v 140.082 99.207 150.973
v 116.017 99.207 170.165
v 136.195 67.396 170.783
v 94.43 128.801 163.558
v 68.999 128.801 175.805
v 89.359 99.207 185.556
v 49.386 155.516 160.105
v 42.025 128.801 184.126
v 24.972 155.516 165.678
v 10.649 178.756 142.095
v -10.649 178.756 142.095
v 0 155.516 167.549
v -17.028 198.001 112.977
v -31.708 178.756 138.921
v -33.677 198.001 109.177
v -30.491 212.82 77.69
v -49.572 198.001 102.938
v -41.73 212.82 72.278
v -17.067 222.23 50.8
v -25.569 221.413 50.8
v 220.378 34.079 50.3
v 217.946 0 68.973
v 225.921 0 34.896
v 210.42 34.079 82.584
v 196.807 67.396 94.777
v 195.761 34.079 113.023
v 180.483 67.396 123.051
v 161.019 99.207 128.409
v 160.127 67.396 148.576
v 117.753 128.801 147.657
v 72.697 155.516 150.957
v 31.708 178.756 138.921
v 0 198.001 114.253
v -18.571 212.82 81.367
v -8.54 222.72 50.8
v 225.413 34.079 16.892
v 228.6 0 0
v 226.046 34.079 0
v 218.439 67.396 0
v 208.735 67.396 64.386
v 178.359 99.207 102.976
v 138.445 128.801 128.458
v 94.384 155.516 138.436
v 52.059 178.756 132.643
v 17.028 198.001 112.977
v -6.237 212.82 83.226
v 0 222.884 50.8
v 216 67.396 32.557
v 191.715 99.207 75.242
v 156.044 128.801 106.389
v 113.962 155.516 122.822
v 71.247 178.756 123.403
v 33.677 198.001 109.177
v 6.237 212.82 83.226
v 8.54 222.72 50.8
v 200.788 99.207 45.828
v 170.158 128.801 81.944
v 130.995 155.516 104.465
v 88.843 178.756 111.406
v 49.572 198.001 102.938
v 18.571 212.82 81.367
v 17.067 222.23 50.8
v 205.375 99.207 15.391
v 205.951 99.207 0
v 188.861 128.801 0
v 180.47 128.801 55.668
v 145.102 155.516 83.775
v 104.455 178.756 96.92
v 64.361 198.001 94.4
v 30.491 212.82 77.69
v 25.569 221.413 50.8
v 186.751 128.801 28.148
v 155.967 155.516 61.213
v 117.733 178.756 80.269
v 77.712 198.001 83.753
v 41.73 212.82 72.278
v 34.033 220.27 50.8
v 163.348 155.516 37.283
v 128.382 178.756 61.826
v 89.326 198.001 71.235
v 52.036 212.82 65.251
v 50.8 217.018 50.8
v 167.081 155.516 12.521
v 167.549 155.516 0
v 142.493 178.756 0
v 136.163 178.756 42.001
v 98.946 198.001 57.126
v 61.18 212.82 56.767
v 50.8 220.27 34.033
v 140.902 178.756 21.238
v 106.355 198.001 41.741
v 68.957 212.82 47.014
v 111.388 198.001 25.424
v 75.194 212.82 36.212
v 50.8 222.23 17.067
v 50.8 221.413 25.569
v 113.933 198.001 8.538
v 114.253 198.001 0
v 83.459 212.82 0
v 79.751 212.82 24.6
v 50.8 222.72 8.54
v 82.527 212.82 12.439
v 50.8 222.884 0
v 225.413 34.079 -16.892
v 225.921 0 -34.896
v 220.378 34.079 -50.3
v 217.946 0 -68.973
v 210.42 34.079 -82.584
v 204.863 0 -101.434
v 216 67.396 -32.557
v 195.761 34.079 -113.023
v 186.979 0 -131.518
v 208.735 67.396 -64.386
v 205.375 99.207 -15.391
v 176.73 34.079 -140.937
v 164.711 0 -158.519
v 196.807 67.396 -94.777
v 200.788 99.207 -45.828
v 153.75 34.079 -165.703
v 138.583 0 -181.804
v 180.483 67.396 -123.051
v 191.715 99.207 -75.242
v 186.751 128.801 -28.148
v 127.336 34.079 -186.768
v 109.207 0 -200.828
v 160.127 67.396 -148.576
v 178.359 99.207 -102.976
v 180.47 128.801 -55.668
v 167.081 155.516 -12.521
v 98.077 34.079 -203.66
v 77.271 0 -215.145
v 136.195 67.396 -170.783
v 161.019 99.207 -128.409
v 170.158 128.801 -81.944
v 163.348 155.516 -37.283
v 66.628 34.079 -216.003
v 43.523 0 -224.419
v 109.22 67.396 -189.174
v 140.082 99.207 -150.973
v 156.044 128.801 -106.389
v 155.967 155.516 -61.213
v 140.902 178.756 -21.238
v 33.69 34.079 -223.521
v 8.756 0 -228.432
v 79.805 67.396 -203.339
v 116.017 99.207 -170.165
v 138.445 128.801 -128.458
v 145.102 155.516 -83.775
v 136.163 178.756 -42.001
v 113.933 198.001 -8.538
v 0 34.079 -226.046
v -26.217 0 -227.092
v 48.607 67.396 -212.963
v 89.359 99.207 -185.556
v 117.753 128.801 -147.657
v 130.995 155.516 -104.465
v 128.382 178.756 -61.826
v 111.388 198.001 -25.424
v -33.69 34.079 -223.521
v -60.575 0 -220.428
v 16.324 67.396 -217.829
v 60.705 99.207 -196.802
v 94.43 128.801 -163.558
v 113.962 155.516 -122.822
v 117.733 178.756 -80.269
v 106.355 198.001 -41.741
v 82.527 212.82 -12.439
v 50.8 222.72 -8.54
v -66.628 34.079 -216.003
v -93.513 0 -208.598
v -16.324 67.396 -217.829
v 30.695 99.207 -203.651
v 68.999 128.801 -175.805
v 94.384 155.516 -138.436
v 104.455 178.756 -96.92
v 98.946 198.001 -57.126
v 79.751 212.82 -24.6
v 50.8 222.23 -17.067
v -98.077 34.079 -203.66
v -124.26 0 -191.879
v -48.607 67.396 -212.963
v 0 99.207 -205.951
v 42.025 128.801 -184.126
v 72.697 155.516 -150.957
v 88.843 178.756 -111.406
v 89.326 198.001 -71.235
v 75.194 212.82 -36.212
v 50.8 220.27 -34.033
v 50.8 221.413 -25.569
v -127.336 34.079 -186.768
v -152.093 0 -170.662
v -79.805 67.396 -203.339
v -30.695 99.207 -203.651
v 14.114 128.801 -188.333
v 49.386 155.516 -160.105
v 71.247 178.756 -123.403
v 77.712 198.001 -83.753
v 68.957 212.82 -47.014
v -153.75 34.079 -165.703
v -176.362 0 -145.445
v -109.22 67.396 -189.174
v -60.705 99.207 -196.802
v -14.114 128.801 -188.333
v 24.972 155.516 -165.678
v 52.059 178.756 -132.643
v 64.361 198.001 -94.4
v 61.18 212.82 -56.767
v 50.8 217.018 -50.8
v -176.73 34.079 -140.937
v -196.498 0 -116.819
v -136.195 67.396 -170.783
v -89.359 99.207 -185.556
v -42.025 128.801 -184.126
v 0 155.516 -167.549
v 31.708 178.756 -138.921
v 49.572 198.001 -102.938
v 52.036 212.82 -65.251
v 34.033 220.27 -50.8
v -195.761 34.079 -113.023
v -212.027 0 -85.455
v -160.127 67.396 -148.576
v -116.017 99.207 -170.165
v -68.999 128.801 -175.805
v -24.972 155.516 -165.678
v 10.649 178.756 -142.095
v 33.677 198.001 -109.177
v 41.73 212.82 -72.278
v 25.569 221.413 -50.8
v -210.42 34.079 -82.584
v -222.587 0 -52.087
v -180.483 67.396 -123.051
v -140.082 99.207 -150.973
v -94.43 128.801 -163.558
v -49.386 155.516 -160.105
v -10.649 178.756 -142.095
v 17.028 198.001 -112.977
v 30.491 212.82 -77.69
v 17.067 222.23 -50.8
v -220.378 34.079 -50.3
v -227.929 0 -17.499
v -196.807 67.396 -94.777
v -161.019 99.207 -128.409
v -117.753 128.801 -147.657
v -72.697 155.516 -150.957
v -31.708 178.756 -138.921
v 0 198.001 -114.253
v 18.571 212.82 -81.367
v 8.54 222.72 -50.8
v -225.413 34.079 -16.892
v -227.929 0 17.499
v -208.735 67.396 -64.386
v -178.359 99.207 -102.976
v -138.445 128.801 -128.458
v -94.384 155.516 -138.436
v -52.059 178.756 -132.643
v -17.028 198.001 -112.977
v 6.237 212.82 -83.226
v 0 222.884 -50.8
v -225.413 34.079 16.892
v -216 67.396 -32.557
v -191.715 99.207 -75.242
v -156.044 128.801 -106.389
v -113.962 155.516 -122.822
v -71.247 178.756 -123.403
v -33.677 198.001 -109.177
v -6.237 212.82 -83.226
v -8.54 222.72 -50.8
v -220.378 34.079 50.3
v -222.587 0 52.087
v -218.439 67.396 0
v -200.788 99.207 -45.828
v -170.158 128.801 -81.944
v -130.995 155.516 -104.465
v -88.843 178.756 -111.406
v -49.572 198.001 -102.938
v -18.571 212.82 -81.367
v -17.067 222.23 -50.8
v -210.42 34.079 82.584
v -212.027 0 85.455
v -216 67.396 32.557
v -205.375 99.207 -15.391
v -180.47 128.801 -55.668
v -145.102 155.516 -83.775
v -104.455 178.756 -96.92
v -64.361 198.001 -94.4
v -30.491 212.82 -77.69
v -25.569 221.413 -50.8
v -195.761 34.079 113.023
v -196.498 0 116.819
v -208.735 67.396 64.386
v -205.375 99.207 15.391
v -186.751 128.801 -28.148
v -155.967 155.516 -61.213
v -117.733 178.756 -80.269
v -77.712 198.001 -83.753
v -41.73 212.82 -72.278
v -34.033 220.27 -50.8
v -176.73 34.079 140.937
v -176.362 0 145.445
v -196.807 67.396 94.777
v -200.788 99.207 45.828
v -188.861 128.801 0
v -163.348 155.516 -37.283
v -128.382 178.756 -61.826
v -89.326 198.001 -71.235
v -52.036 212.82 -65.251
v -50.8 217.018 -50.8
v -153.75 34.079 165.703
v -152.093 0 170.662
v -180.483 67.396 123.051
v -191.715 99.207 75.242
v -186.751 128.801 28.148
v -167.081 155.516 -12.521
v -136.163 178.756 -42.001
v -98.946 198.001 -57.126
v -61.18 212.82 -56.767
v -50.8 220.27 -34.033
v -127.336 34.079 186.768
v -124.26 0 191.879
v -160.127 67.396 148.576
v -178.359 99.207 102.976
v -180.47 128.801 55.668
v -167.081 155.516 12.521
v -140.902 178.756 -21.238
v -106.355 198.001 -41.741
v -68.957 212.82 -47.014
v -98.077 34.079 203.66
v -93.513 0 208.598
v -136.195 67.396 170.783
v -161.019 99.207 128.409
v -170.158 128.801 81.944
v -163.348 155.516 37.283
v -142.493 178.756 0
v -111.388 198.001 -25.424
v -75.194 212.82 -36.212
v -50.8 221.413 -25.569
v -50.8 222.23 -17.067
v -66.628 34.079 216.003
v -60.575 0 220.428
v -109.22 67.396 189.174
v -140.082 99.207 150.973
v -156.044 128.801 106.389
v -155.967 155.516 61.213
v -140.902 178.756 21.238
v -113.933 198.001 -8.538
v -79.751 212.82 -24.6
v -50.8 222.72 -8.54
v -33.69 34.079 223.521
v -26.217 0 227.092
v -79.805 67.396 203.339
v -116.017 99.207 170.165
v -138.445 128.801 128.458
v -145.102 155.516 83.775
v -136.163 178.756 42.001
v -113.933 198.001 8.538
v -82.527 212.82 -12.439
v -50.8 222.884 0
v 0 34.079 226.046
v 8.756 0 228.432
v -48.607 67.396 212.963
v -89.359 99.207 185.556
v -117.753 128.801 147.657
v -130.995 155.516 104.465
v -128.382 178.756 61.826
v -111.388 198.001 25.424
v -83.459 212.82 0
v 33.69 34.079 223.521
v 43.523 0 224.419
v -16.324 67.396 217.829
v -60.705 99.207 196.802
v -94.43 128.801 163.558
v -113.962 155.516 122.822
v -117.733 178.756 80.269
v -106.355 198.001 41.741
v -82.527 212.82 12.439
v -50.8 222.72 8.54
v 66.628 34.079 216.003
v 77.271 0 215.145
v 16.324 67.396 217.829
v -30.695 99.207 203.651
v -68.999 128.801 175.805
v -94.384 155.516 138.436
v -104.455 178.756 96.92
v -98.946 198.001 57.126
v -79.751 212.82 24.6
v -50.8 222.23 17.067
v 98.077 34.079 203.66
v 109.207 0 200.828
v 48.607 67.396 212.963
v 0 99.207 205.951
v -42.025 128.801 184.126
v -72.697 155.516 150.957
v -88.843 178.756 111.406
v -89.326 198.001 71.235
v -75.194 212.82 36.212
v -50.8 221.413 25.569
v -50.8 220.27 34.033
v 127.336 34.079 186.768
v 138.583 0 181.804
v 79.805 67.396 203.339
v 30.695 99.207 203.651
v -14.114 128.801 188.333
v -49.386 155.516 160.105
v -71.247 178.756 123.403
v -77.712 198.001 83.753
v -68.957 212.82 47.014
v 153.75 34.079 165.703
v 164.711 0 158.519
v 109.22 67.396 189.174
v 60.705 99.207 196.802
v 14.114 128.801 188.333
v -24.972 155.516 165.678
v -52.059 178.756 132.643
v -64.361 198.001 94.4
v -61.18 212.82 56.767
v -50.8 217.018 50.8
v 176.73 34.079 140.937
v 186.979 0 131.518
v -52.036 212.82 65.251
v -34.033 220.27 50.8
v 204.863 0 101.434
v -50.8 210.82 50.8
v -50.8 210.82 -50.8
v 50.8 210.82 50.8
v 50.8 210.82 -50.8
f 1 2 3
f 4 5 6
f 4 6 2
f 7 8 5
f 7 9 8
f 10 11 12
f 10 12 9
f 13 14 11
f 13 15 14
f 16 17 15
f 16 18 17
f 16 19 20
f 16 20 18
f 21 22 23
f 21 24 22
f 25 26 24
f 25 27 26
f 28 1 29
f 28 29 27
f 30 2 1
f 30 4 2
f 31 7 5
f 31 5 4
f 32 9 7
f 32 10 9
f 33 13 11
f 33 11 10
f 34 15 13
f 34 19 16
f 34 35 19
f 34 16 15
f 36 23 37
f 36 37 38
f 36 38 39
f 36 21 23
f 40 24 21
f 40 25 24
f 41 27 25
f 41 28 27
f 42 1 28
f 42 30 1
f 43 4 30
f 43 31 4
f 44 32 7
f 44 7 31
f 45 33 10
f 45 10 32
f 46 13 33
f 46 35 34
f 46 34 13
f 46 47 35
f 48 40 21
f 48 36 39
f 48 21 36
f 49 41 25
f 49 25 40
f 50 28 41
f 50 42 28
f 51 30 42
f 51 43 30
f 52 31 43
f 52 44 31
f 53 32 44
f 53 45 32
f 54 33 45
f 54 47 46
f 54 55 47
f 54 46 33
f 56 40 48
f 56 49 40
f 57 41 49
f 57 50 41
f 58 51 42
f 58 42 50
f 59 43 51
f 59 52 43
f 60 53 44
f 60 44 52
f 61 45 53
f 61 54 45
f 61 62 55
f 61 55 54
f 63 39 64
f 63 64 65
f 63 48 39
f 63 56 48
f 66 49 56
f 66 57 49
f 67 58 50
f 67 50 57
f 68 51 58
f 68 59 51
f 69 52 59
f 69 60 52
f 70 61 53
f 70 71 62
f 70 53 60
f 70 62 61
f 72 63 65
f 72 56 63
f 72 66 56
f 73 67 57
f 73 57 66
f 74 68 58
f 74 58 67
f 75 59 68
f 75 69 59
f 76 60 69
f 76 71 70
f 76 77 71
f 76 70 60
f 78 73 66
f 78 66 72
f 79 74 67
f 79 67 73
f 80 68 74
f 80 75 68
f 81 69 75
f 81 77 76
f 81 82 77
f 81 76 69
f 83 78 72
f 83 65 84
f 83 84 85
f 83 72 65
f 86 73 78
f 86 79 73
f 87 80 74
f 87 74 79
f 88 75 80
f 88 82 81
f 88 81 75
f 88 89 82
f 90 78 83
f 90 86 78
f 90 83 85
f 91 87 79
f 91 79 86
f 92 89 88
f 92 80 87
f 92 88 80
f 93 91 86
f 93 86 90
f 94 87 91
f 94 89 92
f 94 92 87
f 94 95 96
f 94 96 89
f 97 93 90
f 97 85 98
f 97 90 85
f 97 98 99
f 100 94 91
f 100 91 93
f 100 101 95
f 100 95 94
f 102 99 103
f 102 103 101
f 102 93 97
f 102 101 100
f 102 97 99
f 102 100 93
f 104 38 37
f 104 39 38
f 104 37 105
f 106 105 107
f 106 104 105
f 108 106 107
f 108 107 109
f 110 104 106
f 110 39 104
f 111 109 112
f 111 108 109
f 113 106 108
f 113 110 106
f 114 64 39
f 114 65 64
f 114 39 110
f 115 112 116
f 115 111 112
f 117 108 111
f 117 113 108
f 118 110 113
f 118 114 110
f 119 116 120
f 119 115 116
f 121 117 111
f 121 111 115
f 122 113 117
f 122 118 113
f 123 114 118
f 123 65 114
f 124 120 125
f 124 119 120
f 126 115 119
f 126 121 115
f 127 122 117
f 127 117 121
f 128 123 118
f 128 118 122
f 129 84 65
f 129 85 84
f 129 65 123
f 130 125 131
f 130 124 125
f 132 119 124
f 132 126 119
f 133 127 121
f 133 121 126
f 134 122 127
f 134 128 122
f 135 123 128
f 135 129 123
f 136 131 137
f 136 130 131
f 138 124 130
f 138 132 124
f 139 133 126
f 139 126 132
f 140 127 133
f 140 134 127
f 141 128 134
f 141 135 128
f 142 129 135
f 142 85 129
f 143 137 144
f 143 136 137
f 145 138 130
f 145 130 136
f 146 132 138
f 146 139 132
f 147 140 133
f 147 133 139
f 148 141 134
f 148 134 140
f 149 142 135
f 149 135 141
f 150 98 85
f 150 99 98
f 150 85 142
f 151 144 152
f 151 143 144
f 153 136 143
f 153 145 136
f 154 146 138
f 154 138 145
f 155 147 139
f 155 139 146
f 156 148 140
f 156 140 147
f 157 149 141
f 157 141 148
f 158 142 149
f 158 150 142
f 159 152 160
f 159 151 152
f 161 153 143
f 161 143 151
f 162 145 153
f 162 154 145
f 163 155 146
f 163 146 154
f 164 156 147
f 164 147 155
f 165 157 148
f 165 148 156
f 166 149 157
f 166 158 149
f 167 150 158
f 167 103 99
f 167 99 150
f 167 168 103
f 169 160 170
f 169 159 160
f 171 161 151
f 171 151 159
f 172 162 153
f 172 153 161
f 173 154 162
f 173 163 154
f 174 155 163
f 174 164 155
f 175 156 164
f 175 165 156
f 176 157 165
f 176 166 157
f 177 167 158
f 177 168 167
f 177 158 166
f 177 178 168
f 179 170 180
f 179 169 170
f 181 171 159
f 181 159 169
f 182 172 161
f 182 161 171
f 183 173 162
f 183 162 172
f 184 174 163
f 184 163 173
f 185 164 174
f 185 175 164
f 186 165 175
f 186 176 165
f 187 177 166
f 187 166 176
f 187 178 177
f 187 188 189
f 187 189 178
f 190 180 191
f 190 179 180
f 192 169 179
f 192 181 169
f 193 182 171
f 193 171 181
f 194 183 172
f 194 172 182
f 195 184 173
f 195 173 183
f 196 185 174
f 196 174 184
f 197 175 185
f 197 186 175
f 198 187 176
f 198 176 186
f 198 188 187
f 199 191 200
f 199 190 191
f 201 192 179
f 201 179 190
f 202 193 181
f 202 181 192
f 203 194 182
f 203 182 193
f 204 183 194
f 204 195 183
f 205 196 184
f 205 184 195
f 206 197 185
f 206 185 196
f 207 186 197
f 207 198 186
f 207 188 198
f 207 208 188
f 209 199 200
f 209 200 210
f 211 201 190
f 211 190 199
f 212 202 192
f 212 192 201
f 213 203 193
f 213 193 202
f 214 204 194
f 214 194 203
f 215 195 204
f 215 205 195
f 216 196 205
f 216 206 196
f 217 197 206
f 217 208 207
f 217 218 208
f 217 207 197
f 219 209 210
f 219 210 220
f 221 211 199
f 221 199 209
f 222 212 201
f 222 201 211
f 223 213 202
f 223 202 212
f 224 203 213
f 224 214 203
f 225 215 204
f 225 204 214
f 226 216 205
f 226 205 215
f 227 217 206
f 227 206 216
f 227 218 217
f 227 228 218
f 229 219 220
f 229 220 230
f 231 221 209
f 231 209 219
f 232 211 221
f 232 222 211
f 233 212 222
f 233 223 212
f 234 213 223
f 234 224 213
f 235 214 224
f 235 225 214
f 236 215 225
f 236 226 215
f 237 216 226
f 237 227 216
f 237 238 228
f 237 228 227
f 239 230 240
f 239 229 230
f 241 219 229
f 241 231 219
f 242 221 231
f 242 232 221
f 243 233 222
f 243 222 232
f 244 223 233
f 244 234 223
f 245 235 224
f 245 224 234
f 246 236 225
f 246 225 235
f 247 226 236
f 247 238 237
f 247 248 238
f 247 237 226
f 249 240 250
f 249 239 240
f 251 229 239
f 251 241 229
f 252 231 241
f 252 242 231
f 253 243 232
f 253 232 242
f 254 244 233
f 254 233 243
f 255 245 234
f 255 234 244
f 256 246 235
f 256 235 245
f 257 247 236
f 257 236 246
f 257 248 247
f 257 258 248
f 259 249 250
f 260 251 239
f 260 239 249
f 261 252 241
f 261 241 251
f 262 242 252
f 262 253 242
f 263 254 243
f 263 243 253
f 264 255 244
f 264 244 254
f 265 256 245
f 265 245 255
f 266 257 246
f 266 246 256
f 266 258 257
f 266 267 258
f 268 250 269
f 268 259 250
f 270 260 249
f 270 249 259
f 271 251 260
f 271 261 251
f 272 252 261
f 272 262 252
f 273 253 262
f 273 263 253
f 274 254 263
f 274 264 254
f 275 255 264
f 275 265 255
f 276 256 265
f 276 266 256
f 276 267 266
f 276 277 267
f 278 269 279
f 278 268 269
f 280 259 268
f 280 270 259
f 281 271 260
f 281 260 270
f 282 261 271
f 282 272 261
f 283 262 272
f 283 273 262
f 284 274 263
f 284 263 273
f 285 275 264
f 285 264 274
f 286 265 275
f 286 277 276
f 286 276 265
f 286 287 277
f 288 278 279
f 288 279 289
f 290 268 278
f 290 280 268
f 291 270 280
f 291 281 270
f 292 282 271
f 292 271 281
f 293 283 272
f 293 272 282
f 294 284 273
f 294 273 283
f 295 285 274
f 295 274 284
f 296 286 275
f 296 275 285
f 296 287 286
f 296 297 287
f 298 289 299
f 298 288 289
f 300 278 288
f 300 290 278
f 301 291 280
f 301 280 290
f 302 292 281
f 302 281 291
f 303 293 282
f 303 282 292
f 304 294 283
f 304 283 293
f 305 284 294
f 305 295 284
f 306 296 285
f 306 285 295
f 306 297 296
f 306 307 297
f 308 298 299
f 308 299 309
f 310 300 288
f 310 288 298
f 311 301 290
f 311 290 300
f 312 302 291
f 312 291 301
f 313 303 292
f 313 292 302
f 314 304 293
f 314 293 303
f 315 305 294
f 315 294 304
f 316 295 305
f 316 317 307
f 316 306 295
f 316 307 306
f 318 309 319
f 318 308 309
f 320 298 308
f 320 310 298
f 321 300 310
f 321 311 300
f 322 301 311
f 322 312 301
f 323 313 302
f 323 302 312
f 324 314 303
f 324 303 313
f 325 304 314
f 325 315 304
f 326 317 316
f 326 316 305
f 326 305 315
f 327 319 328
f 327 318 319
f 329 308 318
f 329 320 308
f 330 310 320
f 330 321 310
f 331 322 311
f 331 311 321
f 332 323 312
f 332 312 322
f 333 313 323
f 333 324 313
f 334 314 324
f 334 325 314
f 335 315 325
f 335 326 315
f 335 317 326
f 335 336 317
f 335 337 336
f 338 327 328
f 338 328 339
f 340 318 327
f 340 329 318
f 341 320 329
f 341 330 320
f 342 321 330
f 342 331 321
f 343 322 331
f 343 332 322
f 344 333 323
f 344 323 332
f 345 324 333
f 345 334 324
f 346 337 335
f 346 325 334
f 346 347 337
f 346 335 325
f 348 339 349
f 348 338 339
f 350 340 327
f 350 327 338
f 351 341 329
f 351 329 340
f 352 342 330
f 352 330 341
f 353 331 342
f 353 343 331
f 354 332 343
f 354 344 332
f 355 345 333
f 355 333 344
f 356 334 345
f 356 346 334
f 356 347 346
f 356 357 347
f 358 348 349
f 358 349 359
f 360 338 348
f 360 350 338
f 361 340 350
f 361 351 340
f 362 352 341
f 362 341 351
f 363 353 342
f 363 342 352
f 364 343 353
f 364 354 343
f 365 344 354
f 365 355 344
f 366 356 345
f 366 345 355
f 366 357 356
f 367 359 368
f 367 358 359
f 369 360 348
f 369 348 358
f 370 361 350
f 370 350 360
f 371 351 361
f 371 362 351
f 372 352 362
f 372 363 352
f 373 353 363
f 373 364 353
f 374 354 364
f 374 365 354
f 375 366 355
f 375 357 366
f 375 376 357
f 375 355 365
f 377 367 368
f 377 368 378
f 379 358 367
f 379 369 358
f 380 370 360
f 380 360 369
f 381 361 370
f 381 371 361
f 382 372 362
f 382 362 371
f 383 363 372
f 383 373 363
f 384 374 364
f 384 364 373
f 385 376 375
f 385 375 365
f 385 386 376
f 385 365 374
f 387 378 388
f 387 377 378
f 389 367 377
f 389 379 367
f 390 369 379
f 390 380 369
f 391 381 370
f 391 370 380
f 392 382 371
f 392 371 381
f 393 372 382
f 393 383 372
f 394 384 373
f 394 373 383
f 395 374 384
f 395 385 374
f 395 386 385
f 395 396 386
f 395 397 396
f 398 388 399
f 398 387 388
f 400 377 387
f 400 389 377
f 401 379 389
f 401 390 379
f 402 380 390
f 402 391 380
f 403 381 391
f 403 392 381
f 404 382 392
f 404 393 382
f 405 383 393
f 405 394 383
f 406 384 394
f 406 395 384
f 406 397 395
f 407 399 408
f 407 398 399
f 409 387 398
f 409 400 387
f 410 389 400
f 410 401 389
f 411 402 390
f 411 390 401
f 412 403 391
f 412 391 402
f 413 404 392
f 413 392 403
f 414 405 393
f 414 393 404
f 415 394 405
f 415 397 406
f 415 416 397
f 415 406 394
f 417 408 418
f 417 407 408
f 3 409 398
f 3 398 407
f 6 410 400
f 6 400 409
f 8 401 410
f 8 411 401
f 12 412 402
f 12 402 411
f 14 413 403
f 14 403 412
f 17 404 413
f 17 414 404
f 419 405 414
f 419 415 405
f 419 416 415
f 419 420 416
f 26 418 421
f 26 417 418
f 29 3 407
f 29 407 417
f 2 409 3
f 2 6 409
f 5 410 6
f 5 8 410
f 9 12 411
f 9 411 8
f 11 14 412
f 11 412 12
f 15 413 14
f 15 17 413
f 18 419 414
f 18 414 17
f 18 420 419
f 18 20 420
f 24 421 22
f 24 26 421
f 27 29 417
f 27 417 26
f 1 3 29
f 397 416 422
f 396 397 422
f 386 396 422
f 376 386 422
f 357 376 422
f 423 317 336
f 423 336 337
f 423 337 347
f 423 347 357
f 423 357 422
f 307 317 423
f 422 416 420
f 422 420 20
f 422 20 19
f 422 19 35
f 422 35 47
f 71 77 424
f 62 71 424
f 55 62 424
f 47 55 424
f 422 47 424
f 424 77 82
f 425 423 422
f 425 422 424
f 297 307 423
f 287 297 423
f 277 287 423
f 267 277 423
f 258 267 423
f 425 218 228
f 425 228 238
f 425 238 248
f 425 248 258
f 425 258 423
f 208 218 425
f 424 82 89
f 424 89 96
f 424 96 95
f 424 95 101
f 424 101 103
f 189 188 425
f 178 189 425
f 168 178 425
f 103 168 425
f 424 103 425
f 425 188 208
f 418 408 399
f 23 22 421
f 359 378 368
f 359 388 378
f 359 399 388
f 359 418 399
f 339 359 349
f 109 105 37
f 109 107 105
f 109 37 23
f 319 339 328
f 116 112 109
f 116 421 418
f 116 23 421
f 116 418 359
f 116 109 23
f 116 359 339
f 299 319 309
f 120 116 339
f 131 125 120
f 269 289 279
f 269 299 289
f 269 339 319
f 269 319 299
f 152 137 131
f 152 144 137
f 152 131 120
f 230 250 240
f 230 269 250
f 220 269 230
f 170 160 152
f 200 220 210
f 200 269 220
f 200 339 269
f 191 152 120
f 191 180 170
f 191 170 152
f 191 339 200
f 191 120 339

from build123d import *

# Parameters (mm, degrees)
SKETCH2_W          = 101.6
SKETCH2_H          = 101.6
CUT_EXTRUDE1_DEPTH = 17.78


with BuildPart() as part:
    # Sketch1 → Revolve1 (revolve)
    with BuildSketch(Plane.XY):
        with BuildLine():
            Line((0, 0), (228.6, 0))
            ThreePointArc((228.6, 0), (161.644610179, 161.644610179), (0, 228.6))
            Line((0, 228.6), (0, 0))
        make_face()
    revolve(axis=Axis((0, 0, 0), (0, 1, 0)))

    # Sketch2 → Cut-Extrude1 (cut)
    with BuildSketch(Plane(origin=(0, 228.6, 0), x_dir=(1, 0, 0), z_dir=(0, 1, 0))):
        Rectangle(SKETCH2_W, SKETCH2_H)
    extrude(amount=-CUT_EXTRUDE1_DEPTH, mode=Mode.SUBTRACT)


solid = part.part
